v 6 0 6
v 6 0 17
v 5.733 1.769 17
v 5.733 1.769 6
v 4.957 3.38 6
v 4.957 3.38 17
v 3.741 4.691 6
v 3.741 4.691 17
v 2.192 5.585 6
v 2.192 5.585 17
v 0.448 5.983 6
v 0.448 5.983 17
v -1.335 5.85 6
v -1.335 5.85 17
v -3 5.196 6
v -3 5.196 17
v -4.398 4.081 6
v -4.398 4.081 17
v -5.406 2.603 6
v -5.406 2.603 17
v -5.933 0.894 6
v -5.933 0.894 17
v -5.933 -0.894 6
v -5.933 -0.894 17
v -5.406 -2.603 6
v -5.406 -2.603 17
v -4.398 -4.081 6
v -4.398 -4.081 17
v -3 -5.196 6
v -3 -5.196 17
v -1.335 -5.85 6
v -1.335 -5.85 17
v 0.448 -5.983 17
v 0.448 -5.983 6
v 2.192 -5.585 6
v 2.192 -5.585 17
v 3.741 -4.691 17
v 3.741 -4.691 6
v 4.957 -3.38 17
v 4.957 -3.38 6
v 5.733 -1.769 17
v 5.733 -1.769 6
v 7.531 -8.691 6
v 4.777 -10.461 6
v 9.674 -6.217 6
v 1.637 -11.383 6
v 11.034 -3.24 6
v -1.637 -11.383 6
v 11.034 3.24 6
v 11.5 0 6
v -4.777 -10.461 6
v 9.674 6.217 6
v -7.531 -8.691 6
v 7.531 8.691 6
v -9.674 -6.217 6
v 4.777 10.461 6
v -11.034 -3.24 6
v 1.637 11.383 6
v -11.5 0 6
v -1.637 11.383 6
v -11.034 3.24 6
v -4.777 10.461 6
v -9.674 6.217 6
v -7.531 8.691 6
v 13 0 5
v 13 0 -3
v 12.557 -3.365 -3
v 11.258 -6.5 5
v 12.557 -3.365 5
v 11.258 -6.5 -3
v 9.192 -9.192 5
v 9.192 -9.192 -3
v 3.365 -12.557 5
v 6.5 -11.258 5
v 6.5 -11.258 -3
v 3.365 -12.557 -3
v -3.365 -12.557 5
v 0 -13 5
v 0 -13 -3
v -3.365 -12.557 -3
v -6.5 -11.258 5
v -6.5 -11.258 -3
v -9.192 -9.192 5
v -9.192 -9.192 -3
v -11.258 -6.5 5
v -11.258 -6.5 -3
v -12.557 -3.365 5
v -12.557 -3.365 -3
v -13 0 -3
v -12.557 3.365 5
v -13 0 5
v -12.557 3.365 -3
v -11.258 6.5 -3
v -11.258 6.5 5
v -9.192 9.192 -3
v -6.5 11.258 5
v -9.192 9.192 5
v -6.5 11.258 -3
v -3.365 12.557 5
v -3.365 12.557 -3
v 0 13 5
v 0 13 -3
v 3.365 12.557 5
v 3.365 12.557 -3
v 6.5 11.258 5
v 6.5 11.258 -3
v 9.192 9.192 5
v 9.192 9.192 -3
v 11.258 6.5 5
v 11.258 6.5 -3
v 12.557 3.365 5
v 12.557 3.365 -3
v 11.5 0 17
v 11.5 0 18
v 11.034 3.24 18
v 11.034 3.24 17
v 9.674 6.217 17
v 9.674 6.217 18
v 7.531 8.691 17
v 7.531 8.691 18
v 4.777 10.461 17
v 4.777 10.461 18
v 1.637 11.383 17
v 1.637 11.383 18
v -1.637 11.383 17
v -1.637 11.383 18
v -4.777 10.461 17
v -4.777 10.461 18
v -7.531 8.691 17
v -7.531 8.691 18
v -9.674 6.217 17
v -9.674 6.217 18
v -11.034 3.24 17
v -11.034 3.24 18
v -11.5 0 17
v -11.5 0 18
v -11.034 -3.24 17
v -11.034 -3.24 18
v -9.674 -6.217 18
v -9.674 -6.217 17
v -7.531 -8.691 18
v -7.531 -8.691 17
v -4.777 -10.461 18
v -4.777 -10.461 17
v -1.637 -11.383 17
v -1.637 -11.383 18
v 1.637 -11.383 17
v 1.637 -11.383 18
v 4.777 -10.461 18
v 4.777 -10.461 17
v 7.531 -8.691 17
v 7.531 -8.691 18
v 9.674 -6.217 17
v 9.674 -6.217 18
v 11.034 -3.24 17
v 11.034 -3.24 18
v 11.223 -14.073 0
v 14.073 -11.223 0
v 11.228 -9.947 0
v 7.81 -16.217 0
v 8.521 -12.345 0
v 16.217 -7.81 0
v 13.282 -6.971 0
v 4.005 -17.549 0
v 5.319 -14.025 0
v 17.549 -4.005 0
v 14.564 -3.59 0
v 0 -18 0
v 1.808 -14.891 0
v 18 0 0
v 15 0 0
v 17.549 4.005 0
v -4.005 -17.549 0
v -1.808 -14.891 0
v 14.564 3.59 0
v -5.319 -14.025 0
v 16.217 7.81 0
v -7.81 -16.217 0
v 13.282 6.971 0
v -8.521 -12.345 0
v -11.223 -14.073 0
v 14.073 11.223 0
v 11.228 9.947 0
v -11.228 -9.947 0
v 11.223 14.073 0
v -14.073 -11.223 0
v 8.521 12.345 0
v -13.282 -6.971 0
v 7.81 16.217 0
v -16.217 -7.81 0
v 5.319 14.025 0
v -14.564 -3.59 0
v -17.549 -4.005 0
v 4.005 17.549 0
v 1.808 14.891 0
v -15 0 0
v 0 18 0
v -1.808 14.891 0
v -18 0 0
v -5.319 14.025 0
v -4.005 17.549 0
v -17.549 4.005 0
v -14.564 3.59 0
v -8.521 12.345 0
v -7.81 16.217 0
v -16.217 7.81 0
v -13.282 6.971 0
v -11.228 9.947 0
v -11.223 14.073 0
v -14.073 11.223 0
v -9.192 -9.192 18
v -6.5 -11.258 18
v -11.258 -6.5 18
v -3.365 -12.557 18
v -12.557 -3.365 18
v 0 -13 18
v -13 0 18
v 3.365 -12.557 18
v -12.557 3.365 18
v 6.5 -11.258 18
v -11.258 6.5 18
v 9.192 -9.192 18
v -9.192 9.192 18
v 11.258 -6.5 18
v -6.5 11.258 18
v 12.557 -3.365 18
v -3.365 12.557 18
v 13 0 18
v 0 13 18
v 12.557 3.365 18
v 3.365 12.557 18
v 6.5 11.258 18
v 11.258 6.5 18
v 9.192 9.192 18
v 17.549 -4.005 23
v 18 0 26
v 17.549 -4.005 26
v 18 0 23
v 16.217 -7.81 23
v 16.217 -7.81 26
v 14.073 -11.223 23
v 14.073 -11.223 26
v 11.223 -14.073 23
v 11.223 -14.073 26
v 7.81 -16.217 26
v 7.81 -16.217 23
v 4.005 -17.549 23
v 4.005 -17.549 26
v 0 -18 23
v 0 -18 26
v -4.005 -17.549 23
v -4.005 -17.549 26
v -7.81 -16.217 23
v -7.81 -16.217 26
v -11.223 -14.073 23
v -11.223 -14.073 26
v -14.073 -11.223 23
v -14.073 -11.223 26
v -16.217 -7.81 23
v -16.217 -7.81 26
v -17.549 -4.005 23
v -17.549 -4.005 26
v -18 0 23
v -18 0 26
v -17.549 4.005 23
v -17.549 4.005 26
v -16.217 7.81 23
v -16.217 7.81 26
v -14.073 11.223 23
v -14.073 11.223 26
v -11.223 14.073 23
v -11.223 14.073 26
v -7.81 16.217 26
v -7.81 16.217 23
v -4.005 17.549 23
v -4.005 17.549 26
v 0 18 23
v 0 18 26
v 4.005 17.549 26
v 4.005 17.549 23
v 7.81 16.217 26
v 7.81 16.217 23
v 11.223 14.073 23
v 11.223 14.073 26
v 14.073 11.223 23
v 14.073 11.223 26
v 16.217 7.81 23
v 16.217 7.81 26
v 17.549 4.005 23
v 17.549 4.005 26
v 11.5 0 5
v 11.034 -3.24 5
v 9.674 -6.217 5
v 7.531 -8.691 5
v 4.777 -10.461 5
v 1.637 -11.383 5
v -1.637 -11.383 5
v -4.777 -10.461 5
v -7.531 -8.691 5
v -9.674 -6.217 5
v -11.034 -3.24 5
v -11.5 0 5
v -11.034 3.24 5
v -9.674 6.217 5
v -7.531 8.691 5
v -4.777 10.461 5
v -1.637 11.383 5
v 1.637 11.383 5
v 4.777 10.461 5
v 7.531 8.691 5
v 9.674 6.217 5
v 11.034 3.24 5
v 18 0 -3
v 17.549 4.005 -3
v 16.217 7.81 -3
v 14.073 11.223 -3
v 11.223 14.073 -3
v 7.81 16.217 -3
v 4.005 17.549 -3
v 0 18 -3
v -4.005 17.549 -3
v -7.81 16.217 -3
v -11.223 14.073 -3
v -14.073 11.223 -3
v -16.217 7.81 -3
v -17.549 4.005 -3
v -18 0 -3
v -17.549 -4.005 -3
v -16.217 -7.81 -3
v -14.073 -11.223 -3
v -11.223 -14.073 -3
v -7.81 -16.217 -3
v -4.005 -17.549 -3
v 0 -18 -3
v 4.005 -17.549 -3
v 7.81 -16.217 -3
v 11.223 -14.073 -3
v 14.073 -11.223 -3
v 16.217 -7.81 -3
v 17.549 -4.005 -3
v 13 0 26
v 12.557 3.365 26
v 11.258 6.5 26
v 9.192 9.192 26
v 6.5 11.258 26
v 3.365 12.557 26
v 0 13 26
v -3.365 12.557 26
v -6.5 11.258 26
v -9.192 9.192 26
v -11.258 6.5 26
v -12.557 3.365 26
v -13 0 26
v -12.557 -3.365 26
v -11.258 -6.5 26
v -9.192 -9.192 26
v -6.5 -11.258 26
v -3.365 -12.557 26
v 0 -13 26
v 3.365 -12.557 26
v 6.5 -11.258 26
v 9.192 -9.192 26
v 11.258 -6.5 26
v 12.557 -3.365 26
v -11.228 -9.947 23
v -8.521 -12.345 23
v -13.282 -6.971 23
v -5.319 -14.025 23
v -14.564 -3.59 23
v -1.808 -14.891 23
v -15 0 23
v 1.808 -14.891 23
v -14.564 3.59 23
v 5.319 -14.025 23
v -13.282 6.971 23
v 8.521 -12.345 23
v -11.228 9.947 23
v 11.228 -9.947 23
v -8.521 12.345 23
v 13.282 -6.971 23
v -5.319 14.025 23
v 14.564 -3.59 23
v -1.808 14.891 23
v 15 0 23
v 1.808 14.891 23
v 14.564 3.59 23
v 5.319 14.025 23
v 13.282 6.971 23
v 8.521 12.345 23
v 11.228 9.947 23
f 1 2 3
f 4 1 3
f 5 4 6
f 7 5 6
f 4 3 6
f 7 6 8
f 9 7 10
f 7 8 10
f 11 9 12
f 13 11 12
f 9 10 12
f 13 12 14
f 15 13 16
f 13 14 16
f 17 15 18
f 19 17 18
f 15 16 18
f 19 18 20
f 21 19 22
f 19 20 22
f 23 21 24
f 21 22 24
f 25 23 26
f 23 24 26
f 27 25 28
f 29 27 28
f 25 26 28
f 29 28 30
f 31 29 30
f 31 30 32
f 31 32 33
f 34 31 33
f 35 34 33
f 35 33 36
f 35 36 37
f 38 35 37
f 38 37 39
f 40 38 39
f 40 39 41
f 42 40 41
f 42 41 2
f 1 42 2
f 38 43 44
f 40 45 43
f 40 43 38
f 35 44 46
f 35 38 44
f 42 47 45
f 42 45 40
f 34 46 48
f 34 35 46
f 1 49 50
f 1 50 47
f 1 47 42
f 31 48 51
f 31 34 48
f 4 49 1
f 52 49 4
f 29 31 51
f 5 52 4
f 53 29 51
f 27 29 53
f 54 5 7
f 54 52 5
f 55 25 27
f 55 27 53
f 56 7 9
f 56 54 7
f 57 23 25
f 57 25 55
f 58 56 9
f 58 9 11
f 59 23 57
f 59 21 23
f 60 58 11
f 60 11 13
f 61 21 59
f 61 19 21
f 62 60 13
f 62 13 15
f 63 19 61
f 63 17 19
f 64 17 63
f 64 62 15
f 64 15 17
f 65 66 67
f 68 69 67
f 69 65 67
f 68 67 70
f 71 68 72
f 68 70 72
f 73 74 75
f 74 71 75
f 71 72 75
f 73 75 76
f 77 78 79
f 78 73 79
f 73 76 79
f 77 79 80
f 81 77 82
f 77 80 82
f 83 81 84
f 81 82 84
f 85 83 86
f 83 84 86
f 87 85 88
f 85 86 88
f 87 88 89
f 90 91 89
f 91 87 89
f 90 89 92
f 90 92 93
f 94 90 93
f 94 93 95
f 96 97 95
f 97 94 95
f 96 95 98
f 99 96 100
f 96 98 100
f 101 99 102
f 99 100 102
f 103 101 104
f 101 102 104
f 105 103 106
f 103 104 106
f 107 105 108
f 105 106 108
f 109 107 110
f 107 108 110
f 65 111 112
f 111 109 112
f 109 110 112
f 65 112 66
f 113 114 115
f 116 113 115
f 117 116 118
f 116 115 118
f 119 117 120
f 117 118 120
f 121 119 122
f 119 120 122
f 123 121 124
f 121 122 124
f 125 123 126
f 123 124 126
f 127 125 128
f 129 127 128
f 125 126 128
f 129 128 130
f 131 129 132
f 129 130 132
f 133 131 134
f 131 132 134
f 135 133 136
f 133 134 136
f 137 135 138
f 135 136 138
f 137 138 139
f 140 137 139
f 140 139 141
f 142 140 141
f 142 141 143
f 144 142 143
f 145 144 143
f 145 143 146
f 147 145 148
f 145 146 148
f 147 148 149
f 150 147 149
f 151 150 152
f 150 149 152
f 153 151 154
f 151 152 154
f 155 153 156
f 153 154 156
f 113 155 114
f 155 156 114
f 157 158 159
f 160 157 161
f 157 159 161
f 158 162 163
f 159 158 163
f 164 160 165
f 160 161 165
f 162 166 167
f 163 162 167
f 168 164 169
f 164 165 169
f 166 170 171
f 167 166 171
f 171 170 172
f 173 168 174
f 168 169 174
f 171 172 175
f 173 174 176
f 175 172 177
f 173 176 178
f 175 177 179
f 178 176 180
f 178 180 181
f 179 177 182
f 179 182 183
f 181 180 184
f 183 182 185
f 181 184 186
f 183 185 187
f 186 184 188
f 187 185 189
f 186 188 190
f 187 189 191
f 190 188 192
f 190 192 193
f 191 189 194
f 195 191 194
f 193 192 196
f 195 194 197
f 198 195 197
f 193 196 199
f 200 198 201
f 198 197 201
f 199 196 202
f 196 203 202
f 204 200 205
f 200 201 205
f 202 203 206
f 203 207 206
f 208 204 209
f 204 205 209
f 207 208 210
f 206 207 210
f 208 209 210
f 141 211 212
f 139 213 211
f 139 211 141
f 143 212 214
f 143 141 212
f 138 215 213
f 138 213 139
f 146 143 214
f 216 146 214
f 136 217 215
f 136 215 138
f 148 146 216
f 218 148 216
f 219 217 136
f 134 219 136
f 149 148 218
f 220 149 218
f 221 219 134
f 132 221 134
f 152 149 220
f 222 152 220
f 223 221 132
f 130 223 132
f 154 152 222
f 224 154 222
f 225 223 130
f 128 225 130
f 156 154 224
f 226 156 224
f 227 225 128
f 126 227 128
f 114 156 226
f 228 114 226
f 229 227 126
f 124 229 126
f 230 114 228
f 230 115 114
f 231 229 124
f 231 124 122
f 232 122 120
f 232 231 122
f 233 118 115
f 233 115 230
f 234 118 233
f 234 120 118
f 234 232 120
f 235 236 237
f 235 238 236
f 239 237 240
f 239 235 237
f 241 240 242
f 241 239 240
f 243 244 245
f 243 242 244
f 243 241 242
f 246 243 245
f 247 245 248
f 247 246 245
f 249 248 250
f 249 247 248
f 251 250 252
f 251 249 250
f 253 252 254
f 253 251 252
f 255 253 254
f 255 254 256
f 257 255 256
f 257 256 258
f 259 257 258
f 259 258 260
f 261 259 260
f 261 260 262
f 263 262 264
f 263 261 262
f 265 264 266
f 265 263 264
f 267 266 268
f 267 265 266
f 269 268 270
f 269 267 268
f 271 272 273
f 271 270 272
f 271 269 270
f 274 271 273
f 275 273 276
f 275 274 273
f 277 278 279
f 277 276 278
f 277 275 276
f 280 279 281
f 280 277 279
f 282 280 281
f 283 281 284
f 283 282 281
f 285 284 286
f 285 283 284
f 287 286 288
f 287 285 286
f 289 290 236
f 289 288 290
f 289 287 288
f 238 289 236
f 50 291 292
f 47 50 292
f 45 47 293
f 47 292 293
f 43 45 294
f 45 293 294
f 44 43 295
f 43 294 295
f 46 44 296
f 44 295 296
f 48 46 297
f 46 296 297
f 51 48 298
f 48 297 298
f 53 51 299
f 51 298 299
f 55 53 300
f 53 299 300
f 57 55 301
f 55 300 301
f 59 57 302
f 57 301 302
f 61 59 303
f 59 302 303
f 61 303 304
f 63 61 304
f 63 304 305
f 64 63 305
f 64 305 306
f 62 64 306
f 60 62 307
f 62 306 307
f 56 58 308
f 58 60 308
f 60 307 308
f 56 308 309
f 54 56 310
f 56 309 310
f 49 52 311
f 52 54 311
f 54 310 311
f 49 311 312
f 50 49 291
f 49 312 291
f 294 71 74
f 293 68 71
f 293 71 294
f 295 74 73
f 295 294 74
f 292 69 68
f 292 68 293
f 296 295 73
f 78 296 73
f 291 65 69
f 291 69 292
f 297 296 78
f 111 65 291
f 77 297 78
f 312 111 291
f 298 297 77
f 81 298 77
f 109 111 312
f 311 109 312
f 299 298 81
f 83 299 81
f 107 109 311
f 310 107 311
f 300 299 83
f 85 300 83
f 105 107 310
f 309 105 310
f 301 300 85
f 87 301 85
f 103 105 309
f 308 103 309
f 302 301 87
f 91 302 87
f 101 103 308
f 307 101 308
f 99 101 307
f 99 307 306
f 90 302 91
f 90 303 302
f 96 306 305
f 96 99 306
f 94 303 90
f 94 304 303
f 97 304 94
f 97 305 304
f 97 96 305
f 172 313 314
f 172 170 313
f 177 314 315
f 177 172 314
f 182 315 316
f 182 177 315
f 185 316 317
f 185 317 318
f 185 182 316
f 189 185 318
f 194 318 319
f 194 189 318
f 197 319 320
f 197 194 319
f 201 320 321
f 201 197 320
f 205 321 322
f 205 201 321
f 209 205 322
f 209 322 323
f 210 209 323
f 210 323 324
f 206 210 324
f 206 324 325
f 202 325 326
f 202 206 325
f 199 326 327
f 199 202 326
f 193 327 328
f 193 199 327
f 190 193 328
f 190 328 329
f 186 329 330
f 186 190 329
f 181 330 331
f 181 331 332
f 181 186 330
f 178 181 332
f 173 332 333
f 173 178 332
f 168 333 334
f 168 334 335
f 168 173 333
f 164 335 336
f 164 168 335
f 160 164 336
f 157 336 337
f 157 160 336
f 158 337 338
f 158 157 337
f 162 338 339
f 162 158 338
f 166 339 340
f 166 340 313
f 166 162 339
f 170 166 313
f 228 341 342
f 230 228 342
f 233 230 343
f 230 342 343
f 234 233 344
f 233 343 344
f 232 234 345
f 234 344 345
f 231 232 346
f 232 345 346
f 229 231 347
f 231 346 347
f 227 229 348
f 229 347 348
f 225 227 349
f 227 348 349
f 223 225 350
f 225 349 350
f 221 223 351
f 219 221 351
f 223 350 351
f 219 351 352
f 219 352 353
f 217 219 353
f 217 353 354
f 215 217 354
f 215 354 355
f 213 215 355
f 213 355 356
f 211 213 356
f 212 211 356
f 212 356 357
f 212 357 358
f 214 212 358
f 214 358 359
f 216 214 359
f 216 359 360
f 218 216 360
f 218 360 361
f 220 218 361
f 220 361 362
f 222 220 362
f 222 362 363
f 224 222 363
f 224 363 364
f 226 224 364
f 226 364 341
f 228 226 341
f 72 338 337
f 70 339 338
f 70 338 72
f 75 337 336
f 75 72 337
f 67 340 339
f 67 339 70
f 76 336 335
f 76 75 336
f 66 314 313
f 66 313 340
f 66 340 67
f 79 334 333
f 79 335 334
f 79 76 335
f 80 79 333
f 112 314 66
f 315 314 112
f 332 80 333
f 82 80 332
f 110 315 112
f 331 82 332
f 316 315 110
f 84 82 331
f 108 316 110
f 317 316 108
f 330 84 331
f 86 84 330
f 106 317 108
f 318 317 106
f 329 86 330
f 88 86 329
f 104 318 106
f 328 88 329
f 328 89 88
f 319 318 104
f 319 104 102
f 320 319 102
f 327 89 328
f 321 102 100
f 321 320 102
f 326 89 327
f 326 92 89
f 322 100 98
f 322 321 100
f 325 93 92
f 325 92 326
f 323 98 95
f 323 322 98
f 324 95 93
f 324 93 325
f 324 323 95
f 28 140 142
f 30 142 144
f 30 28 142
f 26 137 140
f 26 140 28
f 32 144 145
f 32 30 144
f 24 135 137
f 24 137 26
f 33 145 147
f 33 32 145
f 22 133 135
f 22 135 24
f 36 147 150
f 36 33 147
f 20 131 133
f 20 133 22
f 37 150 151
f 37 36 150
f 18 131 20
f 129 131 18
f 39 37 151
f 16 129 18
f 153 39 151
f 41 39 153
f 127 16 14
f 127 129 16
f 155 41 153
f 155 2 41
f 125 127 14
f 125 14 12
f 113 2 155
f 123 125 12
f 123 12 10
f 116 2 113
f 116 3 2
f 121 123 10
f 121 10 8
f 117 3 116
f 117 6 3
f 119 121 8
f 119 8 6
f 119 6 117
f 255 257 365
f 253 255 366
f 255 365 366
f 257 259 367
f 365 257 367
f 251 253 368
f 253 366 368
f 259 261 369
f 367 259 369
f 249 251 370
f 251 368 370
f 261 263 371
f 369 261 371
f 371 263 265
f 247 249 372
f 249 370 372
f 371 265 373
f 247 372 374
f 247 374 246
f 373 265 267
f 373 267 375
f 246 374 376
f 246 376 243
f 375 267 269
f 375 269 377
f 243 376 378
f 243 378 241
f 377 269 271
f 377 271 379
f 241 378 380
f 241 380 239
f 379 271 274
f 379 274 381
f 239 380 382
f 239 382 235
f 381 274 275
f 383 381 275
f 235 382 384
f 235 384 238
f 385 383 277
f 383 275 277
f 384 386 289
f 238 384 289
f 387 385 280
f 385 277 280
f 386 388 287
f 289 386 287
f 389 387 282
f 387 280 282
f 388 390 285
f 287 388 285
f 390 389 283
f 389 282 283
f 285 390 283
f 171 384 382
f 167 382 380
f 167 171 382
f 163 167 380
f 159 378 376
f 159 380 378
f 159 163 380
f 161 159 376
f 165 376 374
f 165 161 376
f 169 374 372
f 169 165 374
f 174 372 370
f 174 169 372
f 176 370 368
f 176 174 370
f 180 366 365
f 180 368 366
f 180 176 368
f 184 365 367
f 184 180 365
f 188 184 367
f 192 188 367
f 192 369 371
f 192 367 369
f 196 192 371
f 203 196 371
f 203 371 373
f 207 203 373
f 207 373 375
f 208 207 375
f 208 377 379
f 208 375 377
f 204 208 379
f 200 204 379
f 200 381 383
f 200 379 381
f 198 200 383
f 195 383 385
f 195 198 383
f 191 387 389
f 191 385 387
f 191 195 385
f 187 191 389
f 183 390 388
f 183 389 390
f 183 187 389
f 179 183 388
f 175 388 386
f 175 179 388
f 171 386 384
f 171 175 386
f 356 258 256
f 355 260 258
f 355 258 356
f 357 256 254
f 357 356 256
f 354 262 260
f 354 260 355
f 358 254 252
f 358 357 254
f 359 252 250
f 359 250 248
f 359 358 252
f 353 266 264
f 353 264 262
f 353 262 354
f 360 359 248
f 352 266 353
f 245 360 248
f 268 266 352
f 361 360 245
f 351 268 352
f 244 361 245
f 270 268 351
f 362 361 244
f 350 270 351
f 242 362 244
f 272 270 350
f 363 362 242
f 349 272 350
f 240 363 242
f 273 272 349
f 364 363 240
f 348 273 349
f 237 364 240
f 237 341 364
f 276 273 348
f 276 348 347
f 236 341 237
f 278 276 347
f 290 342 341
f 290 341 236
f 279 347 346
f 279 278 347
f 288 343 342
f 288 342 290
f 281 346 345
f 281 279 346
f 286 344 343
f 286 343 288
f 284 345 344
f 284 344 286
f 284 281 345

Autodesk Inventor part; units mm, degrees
ref_plane "YZ Plane" through (0, 0, 0) normal (1, 0, 0) x (0, 1, 0)
ref_plane "XZ Plane" through (0, 0, 0) normal (0, 1, 0) x (-1, 0, 0)
sketch "Skizze1" plane through (0, 0, 0) normal (0, 0, 1) x (1, 0, 0)
  circle A0 centre (0, 0) radius 15
  dimension "d0" = 30
extrude "Extrusion1" add sketch "Skizze1" along normal blind 23
sketch "Skizze2" plane through (0, 0, 23) normal (0, 0, 1) x (1, 0, 0)
  circle A0 centre (0, 0) radius 18
  circle A1 centre (0, 0) radius 15 projected
  dimension "d3" = 3
extrude "Extrusion2" add sketch "Skizze2" along normal blind 3 contours A0 | A1
ref_plane "Arbeitsebene1" through (0, 0, 11.5) normal (0, 0, -1) x (-1, 0, 0)
mirror "Spiegeln1" about plane through (0, 0, 11.5) normal (0, 0, -1) of "Extrusion2"
sketch "Skizze3" plane through (0, 0, 26) normal (0, 0, 1) x (1, 0, 0)
  circle A0 centre (0, 0) radius 13
  dimension "d6" = 26
extrude "Extrusion3" cut sketch "Skizze3" against normal blind 8
sketch "Skizze4" plane through (0, 0, 18) normal (0, 0, 1) x (1, 0, 0)
  circle A0 centre (0, 0) radius 11.5
  circle A1 centre (0, 0) radius 13 projected
  dimension "d9" = 1.5
extrude "Extrusion4" cut sketch "Skizze4" against normal blind 1 contours A0
mirror "Spiegeln2" about plane through (0, 0, 11.5) normal (0, 0, -1) of "Extrusion4", "Extrusion3"
sketch "Skizze5" plane through (0, 0, 17) normal (0, 0, 1) x (1, 0, 0)
  circle A0 centre (0, 0) radius 6
  dimension "d12" = 12
extrude "Extrusion5" cut sketch "Skizze5" against normal through all
properties part number "ABS Walze" material "PC/ABS-Kunststoff"
